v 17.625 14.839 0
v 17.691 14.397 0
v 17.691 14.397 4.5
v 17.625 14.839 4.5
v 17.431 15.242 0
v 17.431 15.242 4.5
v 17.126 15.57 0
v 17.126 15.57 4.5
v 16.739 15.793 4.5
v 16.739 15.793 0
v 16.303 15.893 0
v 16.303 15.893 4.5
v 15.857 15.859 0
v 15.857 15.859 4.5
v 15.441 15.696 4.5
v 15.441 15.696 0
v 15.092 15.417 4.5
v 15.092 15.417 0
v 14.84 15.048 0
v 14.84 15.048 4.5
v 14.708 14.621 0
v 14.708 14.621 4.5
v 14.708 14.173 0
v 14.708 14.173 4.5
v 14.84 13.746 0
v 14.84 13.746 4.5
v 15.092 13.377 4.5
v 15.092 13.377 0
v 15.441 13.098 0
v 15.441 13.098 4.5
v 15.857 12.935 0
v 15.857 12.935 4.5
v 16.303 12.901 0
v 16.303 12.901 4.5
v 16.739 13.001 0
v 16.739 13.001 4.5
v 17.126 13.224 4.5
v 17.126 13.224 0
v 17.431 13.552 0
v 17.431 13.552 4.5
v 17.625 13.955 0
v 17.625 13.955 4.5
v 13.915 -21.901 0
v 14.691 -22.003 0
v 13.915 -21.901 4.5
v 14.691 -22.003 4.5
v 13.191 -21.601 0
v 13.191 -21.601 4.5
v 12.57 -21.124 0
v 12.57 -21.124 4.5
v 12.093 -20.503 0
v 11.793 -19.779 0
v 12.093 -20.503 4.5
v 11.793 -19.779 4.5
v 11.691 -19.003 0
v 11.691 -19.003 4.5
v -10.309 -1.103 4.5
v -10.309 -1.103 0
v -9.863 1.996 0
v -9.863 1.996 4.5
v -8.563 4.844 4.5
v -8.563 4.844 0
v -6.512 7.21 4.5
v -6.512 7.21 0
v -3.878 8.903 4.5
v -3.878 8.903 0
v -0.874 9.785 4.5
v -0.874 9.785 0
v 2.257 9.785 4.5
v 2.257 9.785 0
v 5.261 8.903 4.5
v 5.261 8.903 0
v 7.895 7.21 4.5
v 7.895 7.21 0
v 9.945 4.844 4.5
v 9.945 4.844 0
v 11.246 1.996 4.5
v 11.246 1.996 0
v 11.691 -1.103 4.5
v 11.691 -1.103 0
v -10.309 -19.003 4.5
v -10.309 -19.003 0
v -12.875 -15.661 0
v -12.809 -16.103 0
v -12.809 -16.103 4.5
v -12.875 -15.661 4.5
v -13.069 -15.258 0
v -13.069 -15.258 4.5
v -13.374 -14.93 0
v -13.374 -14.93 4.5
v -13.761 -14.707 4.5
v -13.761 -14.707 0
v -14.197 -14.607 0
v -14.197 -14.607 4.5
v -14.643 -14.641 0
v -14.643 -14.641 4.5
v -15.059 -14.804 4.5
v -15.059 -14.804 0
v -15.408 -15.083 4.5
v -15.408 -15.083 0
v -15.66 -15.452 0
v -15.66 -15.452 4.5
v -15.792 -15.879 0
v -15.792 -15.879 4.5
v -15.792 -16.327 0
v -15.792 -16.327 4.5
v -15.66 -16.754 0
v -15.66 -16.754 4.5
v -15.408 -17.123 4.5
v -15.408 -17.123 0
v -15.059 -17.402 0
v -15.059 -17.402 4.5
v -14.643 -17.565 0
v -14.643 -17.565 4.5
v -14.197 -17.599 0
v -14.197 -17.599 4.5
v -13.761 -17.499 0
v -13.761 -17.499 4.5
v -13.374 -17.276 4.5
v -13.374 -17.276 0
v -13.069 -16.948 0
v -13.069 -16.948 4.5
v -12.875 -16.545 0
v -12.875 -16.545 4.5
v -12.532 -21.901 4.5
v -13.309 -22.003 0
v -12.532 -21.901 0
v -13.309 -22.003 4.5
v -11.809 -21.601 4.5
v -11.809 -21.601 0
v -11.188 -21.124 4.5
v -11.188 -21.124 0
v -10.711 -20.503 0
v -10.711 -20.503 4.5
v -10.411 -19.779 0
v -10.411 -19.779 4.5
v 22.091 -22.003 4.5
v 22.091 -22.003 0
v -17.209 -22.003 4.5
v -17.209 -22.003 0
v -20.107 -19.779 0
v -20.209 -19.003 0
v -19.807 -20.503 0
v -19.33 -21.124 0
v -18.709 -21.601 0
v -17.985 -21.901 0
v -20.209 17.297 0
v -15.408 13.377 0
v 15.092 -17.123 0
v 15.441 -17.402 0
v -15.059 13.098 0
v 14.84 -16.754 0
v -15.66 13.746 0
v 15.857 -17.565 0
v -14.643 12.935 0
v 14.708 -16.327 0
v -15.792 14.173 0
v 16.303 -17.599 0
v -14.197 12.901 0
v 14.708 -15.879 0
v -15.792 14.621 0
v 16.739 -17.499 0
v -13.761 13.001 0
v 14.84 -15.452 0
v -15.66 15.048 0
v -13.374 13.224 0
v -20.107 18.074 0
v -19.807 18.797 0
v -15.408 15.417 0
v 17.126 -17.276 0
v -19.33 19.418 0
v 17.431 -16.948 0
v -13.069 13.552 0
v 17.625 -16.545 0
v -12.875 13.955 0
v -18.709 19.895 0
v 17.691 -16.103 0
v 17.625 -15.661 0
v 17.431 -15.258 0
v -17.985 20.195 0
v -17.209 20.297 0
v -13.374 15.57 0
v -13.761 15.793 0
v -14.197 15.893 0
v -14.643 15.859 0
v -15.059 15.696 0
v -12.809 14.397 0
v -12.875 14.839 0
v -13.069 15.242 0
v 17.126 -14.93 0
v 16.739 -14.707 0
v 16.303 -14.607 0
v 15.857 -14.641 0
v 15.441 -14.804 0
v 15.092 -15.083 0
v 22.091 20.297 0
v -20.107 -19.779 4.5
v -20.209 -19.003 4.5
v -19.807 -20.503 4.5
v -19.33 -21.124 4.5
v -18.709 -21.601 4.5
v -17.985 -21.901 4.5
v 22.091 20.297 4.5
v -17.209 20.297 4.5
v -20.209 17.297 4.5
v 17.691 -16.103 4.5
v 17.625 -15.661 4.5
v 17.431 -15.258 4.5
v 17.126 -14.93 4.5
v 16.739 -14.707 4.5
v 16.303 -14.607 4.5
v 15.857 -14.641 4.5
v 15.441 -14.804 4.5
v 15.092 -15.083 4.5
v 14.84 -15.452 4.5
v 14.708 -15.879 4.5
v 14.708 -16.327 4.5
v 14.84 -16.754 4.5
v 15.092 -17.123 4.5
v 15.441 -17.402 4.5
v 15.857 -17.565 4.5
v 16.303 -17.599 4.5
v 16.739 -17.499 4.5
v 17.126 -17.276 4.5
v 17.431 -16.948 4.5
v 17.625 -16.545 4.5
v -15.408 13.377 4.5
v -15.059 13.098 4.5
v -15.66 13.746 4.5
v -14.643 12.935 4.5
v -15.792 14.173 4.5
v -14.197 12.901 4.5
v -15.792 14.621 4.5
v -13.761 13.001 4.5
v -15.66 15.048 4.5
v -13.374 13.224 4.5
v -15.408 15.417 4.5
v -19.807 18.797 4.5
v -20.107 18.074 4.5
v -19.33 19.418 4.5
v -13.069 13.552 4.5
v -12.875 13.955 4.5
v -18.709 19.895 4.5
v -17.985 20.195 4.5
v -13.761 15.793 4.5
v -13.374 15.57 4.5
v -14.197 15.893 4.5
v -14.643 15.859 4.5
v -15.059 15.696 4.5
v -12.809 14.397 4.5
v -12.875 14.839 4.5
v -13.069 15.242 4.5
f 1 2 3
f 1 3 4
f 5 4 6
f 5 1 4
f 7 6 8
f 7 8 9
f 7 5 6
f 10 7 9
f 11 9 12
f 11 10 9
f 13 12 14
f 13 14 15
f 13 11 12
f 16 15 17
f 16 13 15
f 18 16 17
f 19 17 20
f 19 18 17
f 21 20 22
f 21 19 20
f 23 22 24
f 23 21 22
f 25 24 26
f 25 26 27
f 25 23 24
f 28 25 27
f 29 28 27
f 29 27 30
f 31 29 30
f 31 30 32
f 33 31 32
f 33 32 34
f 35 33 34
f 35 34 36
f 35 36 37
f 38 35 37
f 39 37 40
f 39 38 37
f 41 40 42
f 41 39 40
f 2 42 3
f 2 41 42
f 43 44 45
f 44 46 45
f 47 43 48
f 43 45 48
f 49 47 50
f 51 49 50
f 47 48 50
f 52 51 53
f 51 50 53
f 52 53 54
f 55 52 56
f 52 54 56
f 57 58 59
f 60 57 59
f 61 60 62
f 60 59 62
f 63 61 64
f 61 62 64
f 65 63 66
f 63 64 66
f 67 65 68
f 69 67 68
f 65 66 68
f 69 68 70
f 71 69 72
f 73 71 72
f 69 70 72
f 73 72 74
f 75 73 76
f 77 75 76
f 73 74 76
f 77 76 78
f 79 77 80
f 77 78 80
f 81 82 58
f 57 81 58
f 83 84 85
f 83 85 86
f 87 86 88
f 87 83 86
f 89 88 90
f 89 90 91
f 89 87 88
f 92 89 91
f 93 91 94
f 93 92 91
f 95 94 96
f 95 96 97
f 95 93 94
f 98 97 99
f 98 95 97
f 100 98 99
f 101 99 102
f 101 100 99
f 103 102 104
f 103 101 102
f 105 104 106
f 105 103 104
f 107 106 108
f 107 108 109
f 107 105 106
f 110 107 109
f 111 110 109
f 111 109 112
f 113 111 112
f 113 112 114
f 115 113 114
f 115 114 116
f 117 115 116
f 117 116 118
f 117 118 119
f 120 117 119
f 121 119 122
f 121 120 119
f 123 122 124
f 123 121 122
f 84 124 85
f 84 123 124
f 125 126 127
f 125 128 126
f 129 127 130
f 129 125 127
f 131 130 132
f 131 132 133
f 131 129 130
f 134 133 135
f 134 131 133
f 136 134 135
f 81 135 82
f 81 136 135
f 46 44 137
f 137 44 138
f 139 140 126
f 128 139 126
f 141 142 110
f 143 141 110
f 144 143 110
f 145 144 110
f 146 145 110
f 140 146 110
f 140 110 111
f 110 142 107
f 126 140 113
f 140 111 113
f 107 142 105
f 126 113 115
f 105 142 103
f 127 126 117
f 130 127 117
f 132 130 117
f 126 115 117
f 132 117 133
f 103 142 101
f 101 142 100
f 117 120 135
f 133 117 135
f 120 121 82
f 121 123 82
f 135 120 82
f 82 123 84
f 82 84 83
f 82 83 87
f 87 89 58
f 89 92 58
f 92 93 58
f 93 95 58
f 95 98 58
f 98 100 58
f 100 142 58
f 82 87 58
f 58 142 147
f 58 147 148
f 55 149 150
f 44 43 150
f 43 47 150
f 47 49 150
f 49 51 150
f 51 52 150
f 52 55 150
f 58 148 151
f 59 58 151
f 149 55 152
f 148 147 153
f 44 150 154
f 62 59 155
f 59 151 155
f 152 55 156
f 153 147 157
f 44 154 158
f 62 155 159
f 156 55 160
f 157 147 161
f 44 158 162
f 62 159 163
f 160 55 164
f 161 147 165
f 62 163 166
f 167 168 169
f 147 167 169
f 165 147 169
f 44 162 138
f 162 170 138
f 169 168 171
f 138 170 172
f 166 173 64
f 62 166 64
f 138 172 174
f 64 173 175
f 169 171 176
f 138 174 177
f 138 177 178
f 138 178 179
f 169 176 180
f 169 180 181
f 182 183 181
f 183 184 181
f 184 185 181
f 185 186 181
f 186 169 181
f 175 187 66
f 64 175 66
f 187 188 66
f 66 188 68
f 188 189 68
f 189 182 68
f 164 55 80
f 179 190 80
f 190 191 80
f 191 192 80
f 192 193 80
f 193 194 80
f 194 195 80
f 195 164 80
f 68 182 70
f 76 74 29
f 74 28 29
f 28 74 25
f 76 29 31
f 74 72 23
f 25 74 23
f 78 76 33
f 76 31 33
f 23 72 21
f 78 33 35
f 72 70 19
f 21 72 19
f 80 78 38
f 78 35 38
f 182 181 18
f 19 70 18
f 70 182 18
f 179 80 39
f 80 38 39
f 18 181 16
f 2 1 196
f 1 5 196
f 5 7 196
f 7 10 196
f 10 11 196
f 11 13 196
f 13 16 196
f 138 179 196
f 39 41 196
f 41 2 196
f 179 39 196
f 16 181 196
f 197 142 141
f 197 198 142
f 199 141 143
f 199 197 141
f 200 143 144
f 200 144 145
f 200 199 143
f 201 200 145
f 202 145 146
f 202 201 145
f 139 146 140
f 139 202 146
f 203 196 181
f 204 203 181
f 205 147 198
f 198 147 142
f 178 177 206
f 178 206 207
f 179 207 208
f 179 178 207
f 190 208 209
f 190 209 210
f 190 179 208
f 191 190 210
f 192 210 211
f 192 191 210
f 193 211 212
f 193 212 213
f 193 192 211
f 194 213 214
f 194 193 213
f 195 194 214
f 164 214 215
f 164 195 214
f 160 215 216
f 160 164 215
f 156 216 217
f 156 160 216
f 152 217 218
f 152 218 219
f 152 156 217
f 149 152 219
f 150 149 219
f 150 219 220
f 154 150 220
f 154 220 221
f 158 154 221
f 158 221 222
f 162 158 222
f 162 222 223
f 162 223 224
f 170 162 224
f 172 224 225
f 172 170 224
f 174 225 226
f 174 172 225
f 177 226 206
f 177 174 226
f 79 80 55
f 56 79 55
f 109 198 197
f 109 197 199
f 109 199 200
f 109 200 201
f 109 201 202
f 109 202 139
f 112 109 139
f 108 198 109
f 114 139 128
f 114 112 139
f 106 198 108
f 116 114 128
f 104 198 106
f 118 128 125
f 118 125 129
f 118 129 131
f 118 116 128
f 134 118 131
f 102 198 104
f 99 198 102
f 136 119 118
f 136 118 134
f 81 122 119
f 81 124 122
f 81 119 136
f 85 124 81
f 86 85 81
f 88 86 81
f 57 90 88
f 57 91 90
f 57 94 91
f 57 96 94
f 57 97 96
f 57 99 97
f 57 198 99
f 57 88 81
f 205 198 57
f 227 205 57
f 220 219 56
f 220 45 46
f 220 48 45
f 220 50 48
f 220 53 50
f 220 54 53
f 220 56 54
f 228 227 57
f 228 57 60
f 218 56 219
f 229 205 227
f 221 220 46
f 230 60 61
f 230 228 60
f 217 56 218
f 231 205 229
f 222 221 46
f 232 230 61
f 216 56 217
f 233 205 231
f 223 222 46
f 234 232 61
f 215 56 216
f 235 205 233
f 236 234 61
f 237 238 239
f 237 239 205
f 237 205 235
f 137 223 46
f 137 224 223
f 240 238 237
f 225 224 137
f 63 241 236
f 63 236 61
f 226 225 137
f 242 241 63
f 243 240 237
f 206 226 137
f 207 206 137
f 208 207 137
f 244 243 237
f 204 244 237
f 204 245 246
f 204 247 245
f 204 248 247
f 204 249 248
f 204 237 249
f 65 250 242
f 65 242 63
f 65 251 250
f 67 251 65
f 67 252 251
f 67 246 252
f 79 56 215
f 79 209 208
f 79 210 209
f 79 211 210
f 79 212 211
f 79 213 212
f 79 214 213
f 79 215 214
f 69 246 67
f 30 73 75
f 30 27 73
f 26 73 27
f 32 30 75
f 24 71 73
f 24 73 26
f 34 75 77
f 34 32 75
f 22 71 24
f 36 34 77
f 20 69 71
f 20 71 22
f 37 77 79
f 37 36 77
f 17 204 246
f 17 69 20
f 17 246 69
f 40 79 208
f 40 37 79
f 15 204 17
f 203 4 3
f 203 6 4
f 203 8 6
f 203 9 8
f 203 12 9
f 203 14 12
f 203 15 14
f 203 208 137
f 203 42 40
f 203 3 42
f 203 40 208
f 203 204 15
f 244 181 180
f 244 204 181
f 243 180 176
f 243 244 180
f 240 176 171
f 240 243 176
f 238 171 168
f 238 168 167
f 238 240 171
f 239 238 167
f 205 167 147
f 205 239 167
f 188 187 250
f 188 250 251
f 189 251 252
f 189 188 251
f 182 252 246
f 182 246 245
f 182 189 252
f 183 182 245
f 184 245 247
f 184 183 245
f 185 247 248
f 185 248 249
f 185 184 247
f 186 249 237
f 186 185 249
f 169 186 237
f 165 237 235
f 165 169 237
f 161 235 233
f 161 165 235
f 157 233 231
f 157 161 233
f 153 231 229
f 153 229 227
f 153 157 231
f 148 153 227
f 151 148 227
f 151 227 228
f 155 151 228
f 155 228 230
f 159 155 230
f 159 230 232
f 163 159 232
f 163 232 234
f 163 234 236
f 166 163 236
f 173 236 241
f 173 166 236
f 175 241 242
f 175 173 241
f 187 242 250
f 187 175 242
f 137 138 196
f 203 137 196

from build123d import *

# Parameters (mm, degrees)
F0_R     = 1.5
F1_DEPTH = 4.5
F2_R     = 3


with BuildPart() as f1:
    # F0 (on Top) → F1 (new body)
    with BuildSketch(Plane.XY):
        with BuildLine():
            Line((22.091176, 20.297059), (-20.208824, 20.297059))
            Line((-20.208824, 20.297059), (-20.208824, -22.002941))
            Line((-20.208824, -22.002941), (-10.308824, -22.002941))
            Line((-10.308824, -22.002941), (-10.308824, -1.102941))
            ThreePointArc((-10.308824, -1.102941), (0.691176, 9.897059), (11.691176, -1.102941))
            Line((11.691176, -1.102941), (11.691176, -22.002941))
            Line((11.691176, -22.002941), (22.091176, -22.002941))
            Line((22.091176, -22.002941), (22.091176, 20.297059))
        make_face()
        with Locations((-14.308824, -16.102941)):
            Circle(F0_R, mode=Mode.SUBTRACT)
        with Locations((16.191176, -16.102941)):
            Circle(F0_R, mode=Mode.SUBTRACT)
        with Locations((-14.308824, 14.397059)):
            Circle(F0_R, mode=Mode.SUBTRACT)
        with Locations((16.191176, 14.397059)):
            Circle(F0_R, mode=Mode.SUBTRACT)
    extrude(amount=F1_DEPTH)

    # F2
    f2_edges = [f1.edges().sort_by_distance(p)[0] for p in [
        (11.691176, -22.002941, 2.25),
        (-10.308824, -22.002941, 2.25),
        (-20.208824, -22.002941, 2.25),
        (-20.208824, 20.297059, 2.25),
    ]]
    fillet(f2_edges, radius=F2_R)


solid = f1.part
